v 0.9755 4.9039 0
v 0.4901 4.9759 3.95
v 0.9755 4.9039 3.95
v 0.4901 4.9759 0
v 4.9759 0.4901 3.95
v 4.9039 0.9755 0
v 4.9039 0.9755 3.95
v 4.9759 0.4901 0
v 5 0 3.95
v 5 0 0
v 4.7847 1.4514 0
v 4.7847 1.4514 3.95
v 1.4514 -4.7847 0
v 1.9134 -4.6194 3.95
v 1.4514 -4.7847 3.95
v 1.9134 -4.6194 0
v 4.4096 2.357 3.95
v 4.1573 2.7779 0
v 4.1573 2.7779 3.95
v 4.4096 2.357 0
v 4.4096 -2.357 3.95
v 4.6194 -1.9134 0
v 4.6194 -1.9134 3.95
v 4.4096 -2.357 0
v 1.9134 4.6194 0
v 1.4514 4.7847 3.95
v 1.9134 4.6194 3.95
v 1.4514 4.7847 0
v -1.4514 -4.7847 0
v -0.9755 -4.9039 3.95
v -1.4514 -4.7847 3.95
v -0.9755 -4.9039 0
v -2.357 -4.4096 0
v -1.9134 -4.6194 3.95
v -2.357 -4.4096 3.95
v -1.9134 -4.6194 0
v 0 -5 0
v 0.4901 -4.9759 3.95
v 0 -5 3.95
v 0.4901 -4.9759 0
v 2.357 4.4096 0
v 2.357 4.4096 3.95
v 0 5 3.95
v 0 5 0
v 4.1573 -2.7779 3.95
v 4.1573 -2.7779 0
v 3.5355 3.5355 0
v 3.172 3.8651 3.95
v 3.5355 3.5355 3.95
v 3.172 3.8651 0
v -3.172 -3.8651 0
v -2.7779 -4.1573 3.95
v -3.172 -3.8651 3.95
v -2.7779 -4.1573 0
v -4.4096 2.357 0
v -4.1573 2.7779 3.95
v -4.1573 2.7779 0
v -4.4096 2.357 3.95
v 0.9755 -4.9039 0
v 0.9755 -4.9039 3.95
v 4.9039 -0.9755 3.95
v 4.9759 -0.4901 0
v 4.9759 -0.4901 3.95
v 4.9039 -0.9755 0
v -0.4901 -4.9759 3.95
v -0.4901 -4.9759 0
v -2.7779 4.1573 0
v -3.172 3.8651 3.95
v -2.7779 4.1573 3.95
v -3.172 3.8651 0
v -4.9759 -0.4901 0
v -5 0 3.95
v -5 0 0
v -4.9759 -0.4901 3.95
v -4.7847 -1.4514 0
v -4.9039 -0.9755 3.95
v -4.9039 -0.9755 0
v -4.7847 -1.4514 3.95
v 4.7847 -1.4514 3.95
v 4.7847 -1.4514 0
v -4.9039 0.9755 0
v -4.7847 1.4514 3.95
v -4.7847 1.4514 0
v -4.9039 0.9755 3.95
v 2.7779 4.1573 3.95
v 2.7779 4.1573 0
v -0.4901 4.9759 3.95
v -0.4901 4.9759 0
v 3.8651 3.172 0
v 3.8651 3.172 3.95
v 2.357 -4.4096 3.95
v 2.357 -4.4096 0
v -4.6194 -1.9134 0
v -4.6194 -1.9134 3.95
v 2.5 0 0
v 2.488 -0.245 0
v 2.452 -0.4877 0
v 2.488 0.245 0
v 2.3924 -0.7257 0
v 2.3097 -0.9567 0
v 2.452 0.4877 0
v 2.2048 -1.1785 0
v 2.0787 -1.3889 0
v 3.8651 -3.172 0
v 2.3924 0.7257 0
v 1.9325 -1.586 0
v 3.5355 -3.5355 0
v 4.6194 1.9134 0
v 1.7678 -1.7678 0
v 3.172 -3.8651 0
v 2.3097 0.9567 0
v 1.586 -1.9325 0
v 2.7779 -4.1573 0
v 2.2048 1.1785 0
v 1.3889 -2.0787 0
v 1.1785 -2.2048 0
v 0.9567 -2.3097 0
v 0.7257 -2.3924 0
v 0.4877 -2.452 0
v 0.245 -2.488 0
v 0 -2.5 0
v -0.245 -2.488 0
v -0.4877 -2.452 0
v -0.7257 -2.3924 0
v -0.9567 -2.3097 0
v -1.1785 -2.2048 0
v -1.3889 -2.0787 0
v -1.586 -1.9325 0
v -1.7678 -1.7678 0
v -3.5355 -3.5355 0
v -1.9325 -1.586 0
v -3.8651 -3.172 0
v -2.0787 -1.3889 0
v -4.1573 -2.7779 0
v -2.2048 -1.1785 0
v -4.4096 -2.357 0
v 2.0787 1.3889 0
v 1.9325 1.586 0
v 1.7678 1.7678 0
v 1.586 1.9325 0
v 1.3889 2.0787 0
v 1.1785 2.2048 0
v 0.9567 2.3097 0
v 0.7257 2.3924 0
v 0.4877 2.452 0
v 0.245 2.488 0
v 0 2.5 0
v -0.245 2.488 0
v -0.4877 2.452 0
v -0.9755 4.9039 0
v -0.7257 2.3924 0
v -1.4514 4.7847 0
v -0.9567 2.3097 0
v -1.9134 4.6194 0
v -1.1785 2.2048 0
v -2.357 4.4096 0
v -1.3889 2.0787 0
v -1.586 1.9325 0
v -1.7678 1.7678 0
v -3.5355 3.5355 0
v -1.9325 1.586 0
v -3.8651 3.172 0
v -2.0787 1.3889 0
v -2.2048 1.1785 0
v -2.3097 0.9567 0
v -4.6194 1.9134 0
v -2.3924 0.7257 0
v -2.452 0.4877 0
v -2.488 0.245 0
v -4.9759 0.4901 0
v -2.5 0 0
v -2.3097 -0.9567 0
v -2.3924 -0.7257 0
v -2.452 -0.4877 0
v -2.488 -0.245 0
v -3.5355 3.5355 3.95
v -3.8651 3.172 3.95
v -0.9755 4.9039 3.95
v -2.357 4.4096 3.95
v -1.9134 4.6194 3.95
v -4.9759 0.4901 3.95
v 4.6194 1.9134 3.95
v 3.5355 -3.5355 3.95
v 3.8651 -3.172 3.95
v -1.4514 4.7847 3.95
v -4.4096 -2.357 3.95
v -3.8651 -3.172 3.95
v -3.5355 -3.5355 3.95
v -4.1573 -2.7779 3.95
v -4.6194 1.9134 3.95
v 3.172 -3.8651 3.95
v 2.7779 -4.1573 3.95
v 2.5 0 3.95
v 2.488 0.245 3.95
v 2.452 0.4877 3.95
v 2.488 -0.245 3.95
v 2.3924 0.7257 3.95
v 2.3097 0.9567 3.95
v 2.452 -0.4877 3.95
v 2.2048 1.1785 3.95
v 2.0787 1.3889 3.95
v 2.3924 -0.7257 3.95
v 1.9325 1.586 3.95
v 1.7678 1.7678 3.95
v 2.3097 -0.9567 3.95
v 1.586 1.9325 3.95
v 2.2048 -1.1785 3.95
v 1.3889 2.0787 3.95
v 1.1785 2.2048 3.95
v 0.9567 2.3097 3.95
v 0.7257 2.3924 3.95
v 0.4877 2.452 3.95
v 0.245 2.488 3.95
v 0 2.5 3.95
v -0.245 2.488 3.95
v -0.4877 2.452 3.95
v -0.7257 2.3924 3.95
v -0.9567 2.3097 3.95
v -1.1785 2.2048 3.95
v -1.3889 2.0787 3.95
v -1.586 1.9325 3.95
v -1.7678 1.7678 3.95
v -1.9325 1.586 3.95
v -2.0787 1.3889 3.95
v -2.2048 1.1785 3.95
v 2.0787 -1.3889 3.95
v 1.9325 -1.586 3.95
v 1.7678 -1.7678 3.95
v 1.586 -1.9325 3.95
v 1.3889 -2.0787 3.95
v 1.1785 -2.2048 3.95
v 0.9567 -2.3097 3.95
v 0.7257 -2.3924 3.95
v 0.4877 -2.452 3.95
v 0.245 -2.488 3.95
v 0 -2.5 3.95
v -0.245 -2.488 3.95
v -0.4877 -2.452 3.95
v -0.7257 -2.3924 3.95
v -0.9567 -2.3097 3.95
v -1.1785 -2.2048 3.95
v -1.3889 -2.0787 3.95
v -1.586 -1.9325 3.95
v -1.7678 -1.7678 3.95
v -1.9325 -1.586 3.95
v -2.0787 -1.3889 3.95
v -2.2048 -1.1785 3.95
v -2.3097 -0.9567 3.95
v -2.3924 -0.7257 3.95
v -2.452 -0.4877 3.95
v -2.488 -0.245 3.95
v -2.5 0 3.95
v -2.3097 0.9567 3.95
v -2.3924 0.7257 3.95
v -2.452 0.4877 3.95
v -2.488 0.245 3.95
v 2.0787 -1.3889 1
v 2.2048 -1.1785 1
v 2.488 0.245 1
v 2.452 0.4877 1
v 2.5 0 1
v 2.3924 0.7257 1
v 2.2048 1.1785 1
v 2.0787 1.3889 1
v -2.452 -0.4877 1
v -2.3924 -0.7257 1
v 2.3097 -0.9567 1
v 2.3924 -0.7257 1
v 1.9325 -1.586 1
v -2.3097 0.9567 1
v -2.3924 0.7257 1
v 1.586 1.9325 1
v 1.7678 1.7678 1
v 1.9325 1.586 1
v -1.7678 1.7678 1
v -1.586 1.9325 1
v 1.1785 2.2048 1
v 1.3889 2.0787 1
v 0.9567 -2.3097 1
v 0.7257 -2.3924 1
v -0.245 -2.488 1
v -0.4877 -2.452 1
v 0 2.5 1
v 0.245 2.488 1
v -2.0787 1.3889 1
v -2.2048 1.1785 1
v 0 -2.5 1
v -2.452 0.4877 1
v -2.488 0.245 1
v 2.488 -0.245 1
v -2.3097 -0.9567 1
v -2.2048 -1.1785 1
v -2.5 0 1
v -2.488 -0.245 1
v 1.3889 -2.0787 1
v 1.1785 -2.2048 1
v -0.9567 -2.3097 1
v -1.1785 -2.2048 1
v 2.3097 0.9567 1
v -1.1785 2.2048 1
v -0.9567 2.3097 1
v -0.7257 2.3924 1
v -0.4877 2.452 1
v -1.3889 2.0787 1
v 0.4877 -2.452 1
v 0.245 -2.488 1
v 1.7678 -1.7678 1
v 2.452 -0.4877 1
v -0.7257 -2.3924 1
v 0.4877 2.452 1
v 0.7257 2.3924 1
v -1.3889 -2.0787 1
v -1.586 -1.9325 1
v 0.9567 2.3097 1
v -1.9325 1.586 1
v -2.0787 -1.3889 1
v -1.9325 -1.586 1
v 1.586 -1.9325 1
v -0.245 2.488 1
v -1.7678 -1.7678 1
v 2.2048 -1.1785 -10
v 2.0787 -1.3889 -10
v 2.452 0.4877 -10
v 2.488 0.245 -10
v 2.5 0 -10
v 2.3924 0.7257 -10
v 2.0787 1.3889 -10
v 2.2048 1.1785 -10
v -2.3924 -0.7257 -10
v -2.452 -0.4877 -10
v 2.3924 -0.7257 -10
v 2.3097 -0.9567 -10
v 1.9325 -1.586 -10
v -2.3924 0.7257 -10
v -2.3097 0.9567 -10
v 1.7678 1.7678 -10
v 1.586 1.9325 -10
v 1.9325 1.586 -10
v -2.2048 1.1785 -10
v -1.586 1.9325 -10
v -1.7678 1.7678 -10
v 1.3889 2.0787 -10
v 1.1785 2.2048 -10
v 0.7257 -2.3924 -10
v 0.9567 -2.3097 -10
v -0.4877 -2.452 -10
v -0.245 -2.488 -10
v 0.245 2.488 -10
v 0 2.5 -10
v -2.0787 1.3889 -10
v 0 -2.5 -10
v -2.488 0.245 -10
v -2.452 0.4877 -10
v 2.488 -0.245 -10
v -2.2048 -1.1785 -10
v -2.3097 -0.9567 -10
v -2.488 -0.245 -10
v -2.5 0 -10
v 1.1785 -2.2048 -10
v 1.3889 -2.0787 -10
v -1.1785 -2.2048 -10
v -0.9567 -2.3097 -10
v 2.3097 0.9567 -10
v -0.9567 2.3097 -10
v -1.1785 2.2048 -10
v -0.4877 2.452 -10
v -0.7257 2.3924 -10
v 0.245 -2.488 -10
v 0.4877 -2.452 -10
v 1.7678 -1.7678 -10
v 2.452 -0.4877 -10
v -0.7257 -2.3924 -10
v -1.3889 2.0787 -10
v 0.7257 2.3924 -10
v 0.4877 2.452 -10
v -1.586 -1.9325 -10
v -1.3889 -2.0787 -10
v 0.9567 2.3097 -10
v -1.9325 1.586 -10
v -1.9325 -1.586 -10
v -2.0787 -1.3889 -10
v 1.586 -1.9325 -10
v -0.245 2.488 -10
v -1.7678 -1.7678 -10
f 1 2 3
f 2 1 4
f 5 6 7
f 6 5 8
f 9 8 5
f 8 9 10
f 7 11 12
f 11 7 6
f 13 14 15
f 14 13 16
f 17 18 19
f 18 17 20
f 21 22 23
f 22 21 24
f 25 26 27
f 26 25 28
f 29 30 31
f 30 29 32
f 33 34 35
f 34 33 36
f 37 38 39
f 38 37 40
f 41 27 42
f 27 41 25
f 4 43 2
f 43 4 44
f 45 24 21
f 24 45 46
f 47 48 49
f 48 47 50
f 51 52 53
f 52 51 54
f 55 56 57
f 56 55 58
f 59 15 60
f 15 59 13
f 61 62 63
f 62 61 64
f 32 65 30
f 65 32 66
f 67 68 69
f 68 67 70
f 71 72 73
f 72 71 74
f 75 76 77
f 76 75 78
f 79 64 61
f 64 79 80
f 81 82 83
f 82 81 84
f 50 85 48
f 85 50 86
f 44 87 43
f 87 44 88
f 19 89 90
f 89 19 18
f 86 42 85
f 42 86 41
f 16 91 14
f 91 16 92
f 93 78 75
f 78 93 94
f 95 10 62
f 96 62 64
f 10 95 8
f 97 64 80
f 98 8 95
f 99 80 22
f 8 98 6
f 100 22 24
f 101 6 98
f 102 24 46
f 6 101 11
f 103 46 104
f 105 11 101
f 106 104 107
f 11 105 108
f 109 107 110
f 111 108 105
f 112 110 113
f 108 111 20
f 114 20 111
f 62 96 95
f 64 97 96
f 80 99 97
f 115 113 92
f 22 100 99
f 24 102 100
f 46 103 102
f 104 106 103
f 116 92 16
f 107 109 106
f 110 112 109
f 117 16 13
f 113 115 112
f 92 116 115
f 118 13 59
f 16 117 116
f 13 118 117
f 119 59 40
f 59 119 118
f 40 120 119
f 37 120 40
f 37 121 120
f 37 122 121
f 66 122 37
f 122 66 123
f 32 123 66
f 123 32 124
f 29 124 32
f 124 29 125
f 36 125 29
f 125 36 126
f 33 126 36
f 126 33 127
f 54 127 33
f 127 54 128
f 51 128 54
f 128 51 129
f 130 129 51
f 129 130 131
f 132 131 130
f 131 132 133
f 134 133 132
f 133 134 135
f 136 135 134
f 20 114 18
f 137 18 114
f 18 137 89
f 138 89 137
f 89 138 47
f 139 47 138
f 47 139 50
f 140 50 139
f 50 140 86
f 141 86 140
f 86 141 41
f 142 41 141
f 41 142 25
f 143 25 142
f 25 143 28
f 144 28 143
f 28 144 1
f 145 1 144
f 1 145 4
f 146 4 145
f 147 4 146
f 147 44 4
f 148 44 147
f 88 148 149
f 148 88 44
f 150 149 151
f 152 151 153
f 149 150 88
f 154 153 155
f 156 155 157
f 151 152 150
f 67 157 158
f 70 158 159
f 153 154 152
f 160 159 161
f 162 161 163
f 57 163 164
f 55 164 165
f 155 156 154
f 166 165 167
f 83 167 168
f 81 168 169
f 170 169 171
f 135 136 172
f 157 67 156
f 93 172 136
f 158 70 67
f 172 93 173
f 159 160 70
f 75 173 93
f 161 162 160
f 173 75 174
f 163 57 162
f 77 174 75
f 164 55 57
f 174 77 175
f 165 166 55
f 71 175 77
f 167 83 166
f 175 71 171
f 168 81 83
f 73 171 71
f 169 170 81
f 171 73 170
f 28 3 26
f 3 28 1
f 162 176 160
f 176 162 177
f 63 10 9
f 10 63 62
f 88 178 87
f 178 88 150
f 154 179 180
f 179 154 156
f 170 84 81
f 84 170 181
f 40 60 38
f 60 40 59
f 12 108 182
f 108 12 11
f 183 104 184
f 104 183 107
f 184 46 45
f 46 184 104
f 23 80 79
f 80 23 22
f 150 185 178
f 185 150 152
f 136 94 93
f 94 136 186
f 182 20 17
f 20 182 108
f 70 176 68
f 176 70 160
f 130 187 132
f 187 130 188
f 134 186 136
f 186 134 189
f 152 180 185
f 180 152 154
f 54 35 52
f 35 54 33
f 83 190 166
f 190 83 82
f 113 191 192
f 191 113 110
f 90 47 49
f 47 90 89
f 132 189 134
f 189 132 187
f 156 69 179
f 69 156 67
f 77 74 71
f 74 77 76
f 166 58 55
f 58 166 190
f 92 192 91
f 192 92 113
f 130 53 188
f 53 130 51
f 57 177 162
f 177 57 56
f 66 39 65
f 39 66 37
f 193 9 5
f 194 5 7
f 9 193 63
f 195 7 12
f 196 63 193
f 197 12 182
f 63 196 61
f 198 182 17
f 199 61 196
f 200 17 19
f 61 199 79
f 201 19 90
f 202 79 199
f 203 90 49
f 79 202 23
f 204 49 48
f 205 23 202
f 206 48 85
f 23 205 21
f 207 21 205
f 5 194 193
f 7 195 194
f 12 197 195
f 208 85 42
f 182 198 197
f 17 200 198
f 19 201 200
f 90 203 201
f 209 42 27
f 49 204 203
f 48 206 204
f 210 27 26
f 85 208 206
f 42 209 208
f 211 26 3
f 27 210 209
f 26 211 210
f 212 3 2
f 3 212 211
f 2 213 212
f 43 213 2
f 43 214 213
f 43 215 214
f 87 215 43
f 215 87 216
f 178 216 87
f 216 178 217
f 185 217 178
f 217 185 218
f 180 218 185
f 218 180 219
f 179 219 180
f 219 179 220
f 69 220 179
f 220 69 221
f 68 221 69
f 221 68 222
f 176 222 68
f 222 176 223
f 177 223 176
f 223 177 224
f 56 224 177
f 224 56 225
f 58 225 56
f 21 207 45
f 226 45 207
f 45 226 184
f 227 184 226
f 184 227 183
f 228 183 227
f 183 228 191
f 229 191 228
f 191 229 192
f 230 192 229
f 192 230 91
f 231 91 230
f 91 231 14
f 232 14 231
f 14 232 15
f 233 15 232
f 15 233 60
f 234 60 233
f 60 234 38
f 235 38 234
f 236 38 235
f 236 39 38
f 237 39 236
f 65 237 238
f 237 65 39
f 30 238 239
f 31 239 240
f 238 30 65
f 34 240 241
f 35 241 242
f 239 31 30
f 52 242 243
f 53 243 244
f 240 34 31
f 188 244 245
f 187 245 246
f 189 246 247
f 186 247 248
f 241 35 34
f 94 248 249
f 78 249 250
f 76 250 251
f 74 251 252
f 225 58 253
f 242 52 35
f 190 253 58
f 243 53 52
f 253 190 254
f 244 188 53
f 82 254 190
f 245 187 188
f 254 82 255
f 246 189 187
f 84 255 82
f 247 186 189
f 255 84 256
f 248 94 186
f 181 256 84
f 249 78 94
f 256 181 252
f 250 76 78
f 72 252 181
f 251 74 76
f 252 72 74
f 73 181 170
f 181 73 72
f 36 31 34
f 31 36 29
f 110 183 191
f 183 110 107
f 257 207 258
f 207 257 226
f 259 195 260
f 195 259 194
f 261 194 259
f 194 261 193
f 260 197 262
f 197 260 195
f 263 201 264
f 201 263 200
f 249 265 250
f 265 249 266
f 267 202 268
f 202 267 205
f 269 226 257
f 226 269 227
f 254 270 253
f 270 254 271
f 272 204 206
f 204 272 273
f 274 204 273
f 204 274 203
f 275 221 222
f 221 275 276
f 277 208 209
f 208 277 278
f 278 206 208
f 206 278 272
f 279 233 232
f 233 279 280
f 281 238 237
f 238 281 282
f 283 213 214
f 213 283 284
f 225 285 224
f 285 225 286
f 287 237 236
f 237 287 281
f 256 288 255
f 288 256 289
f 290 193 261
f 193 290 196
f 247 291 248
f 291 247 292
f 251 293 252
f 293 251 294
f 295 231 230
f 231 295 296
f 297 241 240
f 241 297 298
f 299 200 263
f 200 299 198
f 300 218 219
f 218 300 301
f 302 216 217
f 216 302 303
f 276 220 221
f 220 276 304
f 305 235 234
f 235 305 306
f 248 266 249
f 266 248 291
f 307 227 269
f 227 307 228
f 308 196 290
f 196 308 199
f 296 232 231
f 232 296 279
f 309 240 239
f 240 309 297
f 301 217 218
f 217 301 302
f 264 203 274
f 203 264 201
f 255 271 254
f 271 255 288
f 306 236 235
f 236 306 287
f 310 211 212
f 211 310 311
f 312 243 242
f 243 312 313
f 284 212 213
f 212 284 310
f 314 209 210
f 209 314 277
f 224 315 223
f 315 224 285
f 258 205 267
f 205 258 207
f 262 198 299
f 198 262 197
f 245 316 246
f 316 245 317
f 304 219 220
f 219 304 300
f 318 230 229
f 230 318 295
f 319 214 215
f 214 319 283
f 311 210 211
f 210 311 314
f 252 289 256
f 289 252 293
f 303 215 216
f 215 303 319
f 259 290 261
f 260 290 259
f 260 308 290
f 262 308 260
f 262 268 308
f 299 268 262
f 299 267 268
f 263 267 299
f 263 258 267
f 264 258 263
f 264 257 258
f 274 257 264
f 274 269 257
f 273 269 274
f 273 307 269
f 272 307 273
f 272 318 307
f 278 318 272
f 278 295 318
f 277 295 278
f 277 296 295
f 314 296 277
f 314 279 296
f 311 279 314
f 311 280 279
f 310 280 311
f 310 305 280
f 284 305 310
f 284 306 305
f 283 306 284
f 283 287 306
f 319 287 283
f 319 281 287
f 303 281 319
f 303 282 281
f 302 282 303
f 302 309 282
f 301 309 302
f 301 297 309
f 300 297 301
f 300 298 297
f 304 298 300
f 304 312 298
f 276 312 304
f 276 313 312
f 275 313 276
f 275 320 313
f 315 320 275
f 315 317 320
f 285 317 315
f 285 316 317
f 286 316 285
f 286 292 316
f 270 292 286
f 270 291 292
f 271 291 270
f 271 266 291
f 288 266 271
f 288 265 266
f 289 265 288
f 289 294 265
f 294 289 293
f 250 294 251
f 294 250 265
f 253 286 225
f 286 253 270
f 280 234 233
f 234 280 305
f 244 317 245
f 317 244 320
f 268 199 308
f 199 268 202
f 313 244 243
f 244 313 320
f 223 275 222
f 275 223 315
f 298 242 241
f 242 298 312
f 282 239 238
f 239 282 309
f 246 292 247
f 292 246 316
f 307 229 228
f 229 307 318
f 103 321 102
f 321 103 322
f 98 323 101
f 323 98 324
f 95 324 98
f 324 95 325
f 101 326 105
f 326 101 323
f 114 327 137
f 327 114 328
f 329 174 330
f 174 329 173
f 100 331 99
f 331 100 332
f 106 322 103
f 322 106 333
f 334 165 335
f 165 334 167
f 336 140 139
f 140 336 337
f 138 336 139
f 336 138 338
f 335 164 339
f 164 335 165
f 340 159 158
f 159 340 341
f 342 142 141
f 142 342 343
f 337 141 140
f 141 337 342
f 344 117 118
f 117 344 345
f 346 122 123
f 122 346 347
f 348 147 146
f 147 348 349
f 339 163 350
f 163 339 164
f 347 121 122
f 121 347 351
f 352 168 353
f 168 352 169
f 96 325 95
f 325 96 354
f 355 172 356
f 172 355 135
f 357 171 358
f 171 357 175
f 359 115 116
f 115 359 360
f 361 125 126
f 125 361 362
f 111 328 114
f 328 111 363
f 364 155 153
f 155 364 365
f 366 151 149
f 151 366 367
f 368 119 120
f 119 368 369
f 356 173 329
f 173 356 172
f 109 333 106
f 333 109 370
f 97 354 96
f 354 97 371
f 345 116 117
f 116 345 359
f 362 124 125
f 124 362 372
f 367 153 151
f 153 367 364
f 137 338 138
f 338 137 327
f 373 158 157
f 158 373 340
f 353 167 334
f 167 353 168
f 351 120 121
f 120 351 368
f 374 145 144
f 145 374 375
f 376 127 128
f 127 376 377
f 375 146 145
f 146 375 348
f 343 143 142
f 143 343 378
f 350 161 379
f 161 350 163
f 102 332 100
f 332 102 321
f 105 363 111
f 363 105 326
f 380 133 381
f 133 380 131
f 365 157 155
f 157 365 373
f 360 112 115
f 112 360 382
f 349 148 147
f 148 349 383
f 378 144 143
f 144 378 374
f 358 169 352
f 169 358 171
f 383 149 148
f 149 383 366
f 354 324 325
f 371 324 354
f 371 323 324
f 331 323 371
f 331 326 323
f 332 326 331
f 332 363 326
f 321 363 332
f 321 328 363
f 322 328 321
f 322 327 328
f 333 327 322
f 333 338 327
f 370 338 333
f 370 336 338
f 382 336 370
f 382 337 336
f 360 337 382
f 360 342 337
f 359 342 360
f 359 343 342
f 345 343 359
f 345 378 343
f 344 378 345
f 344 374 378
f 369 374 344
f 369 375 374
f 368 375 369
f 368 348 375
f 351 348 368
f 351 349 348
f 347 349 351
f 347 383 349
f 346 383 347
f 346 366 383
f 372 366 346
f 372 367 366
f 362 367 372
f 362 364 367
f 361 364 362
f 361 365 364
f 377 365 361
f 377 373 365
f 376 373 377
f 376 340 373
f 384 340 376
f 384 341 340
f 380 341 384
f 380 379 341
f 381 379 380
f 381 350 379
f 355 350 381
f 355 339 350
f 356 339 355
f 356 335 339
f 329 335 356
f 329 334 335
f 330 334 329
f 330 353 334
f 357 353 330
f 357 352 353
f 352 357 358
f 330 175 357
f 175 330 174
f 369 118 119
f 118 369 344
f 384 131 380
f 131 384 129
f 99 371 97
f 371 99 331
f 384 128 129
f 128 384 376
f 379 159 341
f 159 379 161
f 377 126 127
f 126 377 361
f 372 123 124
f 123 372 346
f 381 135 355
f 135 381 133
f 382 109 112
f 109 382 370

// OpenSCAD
module pan_head_screw() {
    // Screw head
    difference() {
        cylinder(h = 3.95, d = 10.0, $fn = 64);
        translate([0, 0, 1.0])
            cylinder(h = 2.95, d = 5.0, $fn = 64);
    }
    
    // Screw shaft
    translate([0, 0, -10])
        cylinder(h = 10, d = 5.0, $fn = 64);
}

pan_head_screw();
